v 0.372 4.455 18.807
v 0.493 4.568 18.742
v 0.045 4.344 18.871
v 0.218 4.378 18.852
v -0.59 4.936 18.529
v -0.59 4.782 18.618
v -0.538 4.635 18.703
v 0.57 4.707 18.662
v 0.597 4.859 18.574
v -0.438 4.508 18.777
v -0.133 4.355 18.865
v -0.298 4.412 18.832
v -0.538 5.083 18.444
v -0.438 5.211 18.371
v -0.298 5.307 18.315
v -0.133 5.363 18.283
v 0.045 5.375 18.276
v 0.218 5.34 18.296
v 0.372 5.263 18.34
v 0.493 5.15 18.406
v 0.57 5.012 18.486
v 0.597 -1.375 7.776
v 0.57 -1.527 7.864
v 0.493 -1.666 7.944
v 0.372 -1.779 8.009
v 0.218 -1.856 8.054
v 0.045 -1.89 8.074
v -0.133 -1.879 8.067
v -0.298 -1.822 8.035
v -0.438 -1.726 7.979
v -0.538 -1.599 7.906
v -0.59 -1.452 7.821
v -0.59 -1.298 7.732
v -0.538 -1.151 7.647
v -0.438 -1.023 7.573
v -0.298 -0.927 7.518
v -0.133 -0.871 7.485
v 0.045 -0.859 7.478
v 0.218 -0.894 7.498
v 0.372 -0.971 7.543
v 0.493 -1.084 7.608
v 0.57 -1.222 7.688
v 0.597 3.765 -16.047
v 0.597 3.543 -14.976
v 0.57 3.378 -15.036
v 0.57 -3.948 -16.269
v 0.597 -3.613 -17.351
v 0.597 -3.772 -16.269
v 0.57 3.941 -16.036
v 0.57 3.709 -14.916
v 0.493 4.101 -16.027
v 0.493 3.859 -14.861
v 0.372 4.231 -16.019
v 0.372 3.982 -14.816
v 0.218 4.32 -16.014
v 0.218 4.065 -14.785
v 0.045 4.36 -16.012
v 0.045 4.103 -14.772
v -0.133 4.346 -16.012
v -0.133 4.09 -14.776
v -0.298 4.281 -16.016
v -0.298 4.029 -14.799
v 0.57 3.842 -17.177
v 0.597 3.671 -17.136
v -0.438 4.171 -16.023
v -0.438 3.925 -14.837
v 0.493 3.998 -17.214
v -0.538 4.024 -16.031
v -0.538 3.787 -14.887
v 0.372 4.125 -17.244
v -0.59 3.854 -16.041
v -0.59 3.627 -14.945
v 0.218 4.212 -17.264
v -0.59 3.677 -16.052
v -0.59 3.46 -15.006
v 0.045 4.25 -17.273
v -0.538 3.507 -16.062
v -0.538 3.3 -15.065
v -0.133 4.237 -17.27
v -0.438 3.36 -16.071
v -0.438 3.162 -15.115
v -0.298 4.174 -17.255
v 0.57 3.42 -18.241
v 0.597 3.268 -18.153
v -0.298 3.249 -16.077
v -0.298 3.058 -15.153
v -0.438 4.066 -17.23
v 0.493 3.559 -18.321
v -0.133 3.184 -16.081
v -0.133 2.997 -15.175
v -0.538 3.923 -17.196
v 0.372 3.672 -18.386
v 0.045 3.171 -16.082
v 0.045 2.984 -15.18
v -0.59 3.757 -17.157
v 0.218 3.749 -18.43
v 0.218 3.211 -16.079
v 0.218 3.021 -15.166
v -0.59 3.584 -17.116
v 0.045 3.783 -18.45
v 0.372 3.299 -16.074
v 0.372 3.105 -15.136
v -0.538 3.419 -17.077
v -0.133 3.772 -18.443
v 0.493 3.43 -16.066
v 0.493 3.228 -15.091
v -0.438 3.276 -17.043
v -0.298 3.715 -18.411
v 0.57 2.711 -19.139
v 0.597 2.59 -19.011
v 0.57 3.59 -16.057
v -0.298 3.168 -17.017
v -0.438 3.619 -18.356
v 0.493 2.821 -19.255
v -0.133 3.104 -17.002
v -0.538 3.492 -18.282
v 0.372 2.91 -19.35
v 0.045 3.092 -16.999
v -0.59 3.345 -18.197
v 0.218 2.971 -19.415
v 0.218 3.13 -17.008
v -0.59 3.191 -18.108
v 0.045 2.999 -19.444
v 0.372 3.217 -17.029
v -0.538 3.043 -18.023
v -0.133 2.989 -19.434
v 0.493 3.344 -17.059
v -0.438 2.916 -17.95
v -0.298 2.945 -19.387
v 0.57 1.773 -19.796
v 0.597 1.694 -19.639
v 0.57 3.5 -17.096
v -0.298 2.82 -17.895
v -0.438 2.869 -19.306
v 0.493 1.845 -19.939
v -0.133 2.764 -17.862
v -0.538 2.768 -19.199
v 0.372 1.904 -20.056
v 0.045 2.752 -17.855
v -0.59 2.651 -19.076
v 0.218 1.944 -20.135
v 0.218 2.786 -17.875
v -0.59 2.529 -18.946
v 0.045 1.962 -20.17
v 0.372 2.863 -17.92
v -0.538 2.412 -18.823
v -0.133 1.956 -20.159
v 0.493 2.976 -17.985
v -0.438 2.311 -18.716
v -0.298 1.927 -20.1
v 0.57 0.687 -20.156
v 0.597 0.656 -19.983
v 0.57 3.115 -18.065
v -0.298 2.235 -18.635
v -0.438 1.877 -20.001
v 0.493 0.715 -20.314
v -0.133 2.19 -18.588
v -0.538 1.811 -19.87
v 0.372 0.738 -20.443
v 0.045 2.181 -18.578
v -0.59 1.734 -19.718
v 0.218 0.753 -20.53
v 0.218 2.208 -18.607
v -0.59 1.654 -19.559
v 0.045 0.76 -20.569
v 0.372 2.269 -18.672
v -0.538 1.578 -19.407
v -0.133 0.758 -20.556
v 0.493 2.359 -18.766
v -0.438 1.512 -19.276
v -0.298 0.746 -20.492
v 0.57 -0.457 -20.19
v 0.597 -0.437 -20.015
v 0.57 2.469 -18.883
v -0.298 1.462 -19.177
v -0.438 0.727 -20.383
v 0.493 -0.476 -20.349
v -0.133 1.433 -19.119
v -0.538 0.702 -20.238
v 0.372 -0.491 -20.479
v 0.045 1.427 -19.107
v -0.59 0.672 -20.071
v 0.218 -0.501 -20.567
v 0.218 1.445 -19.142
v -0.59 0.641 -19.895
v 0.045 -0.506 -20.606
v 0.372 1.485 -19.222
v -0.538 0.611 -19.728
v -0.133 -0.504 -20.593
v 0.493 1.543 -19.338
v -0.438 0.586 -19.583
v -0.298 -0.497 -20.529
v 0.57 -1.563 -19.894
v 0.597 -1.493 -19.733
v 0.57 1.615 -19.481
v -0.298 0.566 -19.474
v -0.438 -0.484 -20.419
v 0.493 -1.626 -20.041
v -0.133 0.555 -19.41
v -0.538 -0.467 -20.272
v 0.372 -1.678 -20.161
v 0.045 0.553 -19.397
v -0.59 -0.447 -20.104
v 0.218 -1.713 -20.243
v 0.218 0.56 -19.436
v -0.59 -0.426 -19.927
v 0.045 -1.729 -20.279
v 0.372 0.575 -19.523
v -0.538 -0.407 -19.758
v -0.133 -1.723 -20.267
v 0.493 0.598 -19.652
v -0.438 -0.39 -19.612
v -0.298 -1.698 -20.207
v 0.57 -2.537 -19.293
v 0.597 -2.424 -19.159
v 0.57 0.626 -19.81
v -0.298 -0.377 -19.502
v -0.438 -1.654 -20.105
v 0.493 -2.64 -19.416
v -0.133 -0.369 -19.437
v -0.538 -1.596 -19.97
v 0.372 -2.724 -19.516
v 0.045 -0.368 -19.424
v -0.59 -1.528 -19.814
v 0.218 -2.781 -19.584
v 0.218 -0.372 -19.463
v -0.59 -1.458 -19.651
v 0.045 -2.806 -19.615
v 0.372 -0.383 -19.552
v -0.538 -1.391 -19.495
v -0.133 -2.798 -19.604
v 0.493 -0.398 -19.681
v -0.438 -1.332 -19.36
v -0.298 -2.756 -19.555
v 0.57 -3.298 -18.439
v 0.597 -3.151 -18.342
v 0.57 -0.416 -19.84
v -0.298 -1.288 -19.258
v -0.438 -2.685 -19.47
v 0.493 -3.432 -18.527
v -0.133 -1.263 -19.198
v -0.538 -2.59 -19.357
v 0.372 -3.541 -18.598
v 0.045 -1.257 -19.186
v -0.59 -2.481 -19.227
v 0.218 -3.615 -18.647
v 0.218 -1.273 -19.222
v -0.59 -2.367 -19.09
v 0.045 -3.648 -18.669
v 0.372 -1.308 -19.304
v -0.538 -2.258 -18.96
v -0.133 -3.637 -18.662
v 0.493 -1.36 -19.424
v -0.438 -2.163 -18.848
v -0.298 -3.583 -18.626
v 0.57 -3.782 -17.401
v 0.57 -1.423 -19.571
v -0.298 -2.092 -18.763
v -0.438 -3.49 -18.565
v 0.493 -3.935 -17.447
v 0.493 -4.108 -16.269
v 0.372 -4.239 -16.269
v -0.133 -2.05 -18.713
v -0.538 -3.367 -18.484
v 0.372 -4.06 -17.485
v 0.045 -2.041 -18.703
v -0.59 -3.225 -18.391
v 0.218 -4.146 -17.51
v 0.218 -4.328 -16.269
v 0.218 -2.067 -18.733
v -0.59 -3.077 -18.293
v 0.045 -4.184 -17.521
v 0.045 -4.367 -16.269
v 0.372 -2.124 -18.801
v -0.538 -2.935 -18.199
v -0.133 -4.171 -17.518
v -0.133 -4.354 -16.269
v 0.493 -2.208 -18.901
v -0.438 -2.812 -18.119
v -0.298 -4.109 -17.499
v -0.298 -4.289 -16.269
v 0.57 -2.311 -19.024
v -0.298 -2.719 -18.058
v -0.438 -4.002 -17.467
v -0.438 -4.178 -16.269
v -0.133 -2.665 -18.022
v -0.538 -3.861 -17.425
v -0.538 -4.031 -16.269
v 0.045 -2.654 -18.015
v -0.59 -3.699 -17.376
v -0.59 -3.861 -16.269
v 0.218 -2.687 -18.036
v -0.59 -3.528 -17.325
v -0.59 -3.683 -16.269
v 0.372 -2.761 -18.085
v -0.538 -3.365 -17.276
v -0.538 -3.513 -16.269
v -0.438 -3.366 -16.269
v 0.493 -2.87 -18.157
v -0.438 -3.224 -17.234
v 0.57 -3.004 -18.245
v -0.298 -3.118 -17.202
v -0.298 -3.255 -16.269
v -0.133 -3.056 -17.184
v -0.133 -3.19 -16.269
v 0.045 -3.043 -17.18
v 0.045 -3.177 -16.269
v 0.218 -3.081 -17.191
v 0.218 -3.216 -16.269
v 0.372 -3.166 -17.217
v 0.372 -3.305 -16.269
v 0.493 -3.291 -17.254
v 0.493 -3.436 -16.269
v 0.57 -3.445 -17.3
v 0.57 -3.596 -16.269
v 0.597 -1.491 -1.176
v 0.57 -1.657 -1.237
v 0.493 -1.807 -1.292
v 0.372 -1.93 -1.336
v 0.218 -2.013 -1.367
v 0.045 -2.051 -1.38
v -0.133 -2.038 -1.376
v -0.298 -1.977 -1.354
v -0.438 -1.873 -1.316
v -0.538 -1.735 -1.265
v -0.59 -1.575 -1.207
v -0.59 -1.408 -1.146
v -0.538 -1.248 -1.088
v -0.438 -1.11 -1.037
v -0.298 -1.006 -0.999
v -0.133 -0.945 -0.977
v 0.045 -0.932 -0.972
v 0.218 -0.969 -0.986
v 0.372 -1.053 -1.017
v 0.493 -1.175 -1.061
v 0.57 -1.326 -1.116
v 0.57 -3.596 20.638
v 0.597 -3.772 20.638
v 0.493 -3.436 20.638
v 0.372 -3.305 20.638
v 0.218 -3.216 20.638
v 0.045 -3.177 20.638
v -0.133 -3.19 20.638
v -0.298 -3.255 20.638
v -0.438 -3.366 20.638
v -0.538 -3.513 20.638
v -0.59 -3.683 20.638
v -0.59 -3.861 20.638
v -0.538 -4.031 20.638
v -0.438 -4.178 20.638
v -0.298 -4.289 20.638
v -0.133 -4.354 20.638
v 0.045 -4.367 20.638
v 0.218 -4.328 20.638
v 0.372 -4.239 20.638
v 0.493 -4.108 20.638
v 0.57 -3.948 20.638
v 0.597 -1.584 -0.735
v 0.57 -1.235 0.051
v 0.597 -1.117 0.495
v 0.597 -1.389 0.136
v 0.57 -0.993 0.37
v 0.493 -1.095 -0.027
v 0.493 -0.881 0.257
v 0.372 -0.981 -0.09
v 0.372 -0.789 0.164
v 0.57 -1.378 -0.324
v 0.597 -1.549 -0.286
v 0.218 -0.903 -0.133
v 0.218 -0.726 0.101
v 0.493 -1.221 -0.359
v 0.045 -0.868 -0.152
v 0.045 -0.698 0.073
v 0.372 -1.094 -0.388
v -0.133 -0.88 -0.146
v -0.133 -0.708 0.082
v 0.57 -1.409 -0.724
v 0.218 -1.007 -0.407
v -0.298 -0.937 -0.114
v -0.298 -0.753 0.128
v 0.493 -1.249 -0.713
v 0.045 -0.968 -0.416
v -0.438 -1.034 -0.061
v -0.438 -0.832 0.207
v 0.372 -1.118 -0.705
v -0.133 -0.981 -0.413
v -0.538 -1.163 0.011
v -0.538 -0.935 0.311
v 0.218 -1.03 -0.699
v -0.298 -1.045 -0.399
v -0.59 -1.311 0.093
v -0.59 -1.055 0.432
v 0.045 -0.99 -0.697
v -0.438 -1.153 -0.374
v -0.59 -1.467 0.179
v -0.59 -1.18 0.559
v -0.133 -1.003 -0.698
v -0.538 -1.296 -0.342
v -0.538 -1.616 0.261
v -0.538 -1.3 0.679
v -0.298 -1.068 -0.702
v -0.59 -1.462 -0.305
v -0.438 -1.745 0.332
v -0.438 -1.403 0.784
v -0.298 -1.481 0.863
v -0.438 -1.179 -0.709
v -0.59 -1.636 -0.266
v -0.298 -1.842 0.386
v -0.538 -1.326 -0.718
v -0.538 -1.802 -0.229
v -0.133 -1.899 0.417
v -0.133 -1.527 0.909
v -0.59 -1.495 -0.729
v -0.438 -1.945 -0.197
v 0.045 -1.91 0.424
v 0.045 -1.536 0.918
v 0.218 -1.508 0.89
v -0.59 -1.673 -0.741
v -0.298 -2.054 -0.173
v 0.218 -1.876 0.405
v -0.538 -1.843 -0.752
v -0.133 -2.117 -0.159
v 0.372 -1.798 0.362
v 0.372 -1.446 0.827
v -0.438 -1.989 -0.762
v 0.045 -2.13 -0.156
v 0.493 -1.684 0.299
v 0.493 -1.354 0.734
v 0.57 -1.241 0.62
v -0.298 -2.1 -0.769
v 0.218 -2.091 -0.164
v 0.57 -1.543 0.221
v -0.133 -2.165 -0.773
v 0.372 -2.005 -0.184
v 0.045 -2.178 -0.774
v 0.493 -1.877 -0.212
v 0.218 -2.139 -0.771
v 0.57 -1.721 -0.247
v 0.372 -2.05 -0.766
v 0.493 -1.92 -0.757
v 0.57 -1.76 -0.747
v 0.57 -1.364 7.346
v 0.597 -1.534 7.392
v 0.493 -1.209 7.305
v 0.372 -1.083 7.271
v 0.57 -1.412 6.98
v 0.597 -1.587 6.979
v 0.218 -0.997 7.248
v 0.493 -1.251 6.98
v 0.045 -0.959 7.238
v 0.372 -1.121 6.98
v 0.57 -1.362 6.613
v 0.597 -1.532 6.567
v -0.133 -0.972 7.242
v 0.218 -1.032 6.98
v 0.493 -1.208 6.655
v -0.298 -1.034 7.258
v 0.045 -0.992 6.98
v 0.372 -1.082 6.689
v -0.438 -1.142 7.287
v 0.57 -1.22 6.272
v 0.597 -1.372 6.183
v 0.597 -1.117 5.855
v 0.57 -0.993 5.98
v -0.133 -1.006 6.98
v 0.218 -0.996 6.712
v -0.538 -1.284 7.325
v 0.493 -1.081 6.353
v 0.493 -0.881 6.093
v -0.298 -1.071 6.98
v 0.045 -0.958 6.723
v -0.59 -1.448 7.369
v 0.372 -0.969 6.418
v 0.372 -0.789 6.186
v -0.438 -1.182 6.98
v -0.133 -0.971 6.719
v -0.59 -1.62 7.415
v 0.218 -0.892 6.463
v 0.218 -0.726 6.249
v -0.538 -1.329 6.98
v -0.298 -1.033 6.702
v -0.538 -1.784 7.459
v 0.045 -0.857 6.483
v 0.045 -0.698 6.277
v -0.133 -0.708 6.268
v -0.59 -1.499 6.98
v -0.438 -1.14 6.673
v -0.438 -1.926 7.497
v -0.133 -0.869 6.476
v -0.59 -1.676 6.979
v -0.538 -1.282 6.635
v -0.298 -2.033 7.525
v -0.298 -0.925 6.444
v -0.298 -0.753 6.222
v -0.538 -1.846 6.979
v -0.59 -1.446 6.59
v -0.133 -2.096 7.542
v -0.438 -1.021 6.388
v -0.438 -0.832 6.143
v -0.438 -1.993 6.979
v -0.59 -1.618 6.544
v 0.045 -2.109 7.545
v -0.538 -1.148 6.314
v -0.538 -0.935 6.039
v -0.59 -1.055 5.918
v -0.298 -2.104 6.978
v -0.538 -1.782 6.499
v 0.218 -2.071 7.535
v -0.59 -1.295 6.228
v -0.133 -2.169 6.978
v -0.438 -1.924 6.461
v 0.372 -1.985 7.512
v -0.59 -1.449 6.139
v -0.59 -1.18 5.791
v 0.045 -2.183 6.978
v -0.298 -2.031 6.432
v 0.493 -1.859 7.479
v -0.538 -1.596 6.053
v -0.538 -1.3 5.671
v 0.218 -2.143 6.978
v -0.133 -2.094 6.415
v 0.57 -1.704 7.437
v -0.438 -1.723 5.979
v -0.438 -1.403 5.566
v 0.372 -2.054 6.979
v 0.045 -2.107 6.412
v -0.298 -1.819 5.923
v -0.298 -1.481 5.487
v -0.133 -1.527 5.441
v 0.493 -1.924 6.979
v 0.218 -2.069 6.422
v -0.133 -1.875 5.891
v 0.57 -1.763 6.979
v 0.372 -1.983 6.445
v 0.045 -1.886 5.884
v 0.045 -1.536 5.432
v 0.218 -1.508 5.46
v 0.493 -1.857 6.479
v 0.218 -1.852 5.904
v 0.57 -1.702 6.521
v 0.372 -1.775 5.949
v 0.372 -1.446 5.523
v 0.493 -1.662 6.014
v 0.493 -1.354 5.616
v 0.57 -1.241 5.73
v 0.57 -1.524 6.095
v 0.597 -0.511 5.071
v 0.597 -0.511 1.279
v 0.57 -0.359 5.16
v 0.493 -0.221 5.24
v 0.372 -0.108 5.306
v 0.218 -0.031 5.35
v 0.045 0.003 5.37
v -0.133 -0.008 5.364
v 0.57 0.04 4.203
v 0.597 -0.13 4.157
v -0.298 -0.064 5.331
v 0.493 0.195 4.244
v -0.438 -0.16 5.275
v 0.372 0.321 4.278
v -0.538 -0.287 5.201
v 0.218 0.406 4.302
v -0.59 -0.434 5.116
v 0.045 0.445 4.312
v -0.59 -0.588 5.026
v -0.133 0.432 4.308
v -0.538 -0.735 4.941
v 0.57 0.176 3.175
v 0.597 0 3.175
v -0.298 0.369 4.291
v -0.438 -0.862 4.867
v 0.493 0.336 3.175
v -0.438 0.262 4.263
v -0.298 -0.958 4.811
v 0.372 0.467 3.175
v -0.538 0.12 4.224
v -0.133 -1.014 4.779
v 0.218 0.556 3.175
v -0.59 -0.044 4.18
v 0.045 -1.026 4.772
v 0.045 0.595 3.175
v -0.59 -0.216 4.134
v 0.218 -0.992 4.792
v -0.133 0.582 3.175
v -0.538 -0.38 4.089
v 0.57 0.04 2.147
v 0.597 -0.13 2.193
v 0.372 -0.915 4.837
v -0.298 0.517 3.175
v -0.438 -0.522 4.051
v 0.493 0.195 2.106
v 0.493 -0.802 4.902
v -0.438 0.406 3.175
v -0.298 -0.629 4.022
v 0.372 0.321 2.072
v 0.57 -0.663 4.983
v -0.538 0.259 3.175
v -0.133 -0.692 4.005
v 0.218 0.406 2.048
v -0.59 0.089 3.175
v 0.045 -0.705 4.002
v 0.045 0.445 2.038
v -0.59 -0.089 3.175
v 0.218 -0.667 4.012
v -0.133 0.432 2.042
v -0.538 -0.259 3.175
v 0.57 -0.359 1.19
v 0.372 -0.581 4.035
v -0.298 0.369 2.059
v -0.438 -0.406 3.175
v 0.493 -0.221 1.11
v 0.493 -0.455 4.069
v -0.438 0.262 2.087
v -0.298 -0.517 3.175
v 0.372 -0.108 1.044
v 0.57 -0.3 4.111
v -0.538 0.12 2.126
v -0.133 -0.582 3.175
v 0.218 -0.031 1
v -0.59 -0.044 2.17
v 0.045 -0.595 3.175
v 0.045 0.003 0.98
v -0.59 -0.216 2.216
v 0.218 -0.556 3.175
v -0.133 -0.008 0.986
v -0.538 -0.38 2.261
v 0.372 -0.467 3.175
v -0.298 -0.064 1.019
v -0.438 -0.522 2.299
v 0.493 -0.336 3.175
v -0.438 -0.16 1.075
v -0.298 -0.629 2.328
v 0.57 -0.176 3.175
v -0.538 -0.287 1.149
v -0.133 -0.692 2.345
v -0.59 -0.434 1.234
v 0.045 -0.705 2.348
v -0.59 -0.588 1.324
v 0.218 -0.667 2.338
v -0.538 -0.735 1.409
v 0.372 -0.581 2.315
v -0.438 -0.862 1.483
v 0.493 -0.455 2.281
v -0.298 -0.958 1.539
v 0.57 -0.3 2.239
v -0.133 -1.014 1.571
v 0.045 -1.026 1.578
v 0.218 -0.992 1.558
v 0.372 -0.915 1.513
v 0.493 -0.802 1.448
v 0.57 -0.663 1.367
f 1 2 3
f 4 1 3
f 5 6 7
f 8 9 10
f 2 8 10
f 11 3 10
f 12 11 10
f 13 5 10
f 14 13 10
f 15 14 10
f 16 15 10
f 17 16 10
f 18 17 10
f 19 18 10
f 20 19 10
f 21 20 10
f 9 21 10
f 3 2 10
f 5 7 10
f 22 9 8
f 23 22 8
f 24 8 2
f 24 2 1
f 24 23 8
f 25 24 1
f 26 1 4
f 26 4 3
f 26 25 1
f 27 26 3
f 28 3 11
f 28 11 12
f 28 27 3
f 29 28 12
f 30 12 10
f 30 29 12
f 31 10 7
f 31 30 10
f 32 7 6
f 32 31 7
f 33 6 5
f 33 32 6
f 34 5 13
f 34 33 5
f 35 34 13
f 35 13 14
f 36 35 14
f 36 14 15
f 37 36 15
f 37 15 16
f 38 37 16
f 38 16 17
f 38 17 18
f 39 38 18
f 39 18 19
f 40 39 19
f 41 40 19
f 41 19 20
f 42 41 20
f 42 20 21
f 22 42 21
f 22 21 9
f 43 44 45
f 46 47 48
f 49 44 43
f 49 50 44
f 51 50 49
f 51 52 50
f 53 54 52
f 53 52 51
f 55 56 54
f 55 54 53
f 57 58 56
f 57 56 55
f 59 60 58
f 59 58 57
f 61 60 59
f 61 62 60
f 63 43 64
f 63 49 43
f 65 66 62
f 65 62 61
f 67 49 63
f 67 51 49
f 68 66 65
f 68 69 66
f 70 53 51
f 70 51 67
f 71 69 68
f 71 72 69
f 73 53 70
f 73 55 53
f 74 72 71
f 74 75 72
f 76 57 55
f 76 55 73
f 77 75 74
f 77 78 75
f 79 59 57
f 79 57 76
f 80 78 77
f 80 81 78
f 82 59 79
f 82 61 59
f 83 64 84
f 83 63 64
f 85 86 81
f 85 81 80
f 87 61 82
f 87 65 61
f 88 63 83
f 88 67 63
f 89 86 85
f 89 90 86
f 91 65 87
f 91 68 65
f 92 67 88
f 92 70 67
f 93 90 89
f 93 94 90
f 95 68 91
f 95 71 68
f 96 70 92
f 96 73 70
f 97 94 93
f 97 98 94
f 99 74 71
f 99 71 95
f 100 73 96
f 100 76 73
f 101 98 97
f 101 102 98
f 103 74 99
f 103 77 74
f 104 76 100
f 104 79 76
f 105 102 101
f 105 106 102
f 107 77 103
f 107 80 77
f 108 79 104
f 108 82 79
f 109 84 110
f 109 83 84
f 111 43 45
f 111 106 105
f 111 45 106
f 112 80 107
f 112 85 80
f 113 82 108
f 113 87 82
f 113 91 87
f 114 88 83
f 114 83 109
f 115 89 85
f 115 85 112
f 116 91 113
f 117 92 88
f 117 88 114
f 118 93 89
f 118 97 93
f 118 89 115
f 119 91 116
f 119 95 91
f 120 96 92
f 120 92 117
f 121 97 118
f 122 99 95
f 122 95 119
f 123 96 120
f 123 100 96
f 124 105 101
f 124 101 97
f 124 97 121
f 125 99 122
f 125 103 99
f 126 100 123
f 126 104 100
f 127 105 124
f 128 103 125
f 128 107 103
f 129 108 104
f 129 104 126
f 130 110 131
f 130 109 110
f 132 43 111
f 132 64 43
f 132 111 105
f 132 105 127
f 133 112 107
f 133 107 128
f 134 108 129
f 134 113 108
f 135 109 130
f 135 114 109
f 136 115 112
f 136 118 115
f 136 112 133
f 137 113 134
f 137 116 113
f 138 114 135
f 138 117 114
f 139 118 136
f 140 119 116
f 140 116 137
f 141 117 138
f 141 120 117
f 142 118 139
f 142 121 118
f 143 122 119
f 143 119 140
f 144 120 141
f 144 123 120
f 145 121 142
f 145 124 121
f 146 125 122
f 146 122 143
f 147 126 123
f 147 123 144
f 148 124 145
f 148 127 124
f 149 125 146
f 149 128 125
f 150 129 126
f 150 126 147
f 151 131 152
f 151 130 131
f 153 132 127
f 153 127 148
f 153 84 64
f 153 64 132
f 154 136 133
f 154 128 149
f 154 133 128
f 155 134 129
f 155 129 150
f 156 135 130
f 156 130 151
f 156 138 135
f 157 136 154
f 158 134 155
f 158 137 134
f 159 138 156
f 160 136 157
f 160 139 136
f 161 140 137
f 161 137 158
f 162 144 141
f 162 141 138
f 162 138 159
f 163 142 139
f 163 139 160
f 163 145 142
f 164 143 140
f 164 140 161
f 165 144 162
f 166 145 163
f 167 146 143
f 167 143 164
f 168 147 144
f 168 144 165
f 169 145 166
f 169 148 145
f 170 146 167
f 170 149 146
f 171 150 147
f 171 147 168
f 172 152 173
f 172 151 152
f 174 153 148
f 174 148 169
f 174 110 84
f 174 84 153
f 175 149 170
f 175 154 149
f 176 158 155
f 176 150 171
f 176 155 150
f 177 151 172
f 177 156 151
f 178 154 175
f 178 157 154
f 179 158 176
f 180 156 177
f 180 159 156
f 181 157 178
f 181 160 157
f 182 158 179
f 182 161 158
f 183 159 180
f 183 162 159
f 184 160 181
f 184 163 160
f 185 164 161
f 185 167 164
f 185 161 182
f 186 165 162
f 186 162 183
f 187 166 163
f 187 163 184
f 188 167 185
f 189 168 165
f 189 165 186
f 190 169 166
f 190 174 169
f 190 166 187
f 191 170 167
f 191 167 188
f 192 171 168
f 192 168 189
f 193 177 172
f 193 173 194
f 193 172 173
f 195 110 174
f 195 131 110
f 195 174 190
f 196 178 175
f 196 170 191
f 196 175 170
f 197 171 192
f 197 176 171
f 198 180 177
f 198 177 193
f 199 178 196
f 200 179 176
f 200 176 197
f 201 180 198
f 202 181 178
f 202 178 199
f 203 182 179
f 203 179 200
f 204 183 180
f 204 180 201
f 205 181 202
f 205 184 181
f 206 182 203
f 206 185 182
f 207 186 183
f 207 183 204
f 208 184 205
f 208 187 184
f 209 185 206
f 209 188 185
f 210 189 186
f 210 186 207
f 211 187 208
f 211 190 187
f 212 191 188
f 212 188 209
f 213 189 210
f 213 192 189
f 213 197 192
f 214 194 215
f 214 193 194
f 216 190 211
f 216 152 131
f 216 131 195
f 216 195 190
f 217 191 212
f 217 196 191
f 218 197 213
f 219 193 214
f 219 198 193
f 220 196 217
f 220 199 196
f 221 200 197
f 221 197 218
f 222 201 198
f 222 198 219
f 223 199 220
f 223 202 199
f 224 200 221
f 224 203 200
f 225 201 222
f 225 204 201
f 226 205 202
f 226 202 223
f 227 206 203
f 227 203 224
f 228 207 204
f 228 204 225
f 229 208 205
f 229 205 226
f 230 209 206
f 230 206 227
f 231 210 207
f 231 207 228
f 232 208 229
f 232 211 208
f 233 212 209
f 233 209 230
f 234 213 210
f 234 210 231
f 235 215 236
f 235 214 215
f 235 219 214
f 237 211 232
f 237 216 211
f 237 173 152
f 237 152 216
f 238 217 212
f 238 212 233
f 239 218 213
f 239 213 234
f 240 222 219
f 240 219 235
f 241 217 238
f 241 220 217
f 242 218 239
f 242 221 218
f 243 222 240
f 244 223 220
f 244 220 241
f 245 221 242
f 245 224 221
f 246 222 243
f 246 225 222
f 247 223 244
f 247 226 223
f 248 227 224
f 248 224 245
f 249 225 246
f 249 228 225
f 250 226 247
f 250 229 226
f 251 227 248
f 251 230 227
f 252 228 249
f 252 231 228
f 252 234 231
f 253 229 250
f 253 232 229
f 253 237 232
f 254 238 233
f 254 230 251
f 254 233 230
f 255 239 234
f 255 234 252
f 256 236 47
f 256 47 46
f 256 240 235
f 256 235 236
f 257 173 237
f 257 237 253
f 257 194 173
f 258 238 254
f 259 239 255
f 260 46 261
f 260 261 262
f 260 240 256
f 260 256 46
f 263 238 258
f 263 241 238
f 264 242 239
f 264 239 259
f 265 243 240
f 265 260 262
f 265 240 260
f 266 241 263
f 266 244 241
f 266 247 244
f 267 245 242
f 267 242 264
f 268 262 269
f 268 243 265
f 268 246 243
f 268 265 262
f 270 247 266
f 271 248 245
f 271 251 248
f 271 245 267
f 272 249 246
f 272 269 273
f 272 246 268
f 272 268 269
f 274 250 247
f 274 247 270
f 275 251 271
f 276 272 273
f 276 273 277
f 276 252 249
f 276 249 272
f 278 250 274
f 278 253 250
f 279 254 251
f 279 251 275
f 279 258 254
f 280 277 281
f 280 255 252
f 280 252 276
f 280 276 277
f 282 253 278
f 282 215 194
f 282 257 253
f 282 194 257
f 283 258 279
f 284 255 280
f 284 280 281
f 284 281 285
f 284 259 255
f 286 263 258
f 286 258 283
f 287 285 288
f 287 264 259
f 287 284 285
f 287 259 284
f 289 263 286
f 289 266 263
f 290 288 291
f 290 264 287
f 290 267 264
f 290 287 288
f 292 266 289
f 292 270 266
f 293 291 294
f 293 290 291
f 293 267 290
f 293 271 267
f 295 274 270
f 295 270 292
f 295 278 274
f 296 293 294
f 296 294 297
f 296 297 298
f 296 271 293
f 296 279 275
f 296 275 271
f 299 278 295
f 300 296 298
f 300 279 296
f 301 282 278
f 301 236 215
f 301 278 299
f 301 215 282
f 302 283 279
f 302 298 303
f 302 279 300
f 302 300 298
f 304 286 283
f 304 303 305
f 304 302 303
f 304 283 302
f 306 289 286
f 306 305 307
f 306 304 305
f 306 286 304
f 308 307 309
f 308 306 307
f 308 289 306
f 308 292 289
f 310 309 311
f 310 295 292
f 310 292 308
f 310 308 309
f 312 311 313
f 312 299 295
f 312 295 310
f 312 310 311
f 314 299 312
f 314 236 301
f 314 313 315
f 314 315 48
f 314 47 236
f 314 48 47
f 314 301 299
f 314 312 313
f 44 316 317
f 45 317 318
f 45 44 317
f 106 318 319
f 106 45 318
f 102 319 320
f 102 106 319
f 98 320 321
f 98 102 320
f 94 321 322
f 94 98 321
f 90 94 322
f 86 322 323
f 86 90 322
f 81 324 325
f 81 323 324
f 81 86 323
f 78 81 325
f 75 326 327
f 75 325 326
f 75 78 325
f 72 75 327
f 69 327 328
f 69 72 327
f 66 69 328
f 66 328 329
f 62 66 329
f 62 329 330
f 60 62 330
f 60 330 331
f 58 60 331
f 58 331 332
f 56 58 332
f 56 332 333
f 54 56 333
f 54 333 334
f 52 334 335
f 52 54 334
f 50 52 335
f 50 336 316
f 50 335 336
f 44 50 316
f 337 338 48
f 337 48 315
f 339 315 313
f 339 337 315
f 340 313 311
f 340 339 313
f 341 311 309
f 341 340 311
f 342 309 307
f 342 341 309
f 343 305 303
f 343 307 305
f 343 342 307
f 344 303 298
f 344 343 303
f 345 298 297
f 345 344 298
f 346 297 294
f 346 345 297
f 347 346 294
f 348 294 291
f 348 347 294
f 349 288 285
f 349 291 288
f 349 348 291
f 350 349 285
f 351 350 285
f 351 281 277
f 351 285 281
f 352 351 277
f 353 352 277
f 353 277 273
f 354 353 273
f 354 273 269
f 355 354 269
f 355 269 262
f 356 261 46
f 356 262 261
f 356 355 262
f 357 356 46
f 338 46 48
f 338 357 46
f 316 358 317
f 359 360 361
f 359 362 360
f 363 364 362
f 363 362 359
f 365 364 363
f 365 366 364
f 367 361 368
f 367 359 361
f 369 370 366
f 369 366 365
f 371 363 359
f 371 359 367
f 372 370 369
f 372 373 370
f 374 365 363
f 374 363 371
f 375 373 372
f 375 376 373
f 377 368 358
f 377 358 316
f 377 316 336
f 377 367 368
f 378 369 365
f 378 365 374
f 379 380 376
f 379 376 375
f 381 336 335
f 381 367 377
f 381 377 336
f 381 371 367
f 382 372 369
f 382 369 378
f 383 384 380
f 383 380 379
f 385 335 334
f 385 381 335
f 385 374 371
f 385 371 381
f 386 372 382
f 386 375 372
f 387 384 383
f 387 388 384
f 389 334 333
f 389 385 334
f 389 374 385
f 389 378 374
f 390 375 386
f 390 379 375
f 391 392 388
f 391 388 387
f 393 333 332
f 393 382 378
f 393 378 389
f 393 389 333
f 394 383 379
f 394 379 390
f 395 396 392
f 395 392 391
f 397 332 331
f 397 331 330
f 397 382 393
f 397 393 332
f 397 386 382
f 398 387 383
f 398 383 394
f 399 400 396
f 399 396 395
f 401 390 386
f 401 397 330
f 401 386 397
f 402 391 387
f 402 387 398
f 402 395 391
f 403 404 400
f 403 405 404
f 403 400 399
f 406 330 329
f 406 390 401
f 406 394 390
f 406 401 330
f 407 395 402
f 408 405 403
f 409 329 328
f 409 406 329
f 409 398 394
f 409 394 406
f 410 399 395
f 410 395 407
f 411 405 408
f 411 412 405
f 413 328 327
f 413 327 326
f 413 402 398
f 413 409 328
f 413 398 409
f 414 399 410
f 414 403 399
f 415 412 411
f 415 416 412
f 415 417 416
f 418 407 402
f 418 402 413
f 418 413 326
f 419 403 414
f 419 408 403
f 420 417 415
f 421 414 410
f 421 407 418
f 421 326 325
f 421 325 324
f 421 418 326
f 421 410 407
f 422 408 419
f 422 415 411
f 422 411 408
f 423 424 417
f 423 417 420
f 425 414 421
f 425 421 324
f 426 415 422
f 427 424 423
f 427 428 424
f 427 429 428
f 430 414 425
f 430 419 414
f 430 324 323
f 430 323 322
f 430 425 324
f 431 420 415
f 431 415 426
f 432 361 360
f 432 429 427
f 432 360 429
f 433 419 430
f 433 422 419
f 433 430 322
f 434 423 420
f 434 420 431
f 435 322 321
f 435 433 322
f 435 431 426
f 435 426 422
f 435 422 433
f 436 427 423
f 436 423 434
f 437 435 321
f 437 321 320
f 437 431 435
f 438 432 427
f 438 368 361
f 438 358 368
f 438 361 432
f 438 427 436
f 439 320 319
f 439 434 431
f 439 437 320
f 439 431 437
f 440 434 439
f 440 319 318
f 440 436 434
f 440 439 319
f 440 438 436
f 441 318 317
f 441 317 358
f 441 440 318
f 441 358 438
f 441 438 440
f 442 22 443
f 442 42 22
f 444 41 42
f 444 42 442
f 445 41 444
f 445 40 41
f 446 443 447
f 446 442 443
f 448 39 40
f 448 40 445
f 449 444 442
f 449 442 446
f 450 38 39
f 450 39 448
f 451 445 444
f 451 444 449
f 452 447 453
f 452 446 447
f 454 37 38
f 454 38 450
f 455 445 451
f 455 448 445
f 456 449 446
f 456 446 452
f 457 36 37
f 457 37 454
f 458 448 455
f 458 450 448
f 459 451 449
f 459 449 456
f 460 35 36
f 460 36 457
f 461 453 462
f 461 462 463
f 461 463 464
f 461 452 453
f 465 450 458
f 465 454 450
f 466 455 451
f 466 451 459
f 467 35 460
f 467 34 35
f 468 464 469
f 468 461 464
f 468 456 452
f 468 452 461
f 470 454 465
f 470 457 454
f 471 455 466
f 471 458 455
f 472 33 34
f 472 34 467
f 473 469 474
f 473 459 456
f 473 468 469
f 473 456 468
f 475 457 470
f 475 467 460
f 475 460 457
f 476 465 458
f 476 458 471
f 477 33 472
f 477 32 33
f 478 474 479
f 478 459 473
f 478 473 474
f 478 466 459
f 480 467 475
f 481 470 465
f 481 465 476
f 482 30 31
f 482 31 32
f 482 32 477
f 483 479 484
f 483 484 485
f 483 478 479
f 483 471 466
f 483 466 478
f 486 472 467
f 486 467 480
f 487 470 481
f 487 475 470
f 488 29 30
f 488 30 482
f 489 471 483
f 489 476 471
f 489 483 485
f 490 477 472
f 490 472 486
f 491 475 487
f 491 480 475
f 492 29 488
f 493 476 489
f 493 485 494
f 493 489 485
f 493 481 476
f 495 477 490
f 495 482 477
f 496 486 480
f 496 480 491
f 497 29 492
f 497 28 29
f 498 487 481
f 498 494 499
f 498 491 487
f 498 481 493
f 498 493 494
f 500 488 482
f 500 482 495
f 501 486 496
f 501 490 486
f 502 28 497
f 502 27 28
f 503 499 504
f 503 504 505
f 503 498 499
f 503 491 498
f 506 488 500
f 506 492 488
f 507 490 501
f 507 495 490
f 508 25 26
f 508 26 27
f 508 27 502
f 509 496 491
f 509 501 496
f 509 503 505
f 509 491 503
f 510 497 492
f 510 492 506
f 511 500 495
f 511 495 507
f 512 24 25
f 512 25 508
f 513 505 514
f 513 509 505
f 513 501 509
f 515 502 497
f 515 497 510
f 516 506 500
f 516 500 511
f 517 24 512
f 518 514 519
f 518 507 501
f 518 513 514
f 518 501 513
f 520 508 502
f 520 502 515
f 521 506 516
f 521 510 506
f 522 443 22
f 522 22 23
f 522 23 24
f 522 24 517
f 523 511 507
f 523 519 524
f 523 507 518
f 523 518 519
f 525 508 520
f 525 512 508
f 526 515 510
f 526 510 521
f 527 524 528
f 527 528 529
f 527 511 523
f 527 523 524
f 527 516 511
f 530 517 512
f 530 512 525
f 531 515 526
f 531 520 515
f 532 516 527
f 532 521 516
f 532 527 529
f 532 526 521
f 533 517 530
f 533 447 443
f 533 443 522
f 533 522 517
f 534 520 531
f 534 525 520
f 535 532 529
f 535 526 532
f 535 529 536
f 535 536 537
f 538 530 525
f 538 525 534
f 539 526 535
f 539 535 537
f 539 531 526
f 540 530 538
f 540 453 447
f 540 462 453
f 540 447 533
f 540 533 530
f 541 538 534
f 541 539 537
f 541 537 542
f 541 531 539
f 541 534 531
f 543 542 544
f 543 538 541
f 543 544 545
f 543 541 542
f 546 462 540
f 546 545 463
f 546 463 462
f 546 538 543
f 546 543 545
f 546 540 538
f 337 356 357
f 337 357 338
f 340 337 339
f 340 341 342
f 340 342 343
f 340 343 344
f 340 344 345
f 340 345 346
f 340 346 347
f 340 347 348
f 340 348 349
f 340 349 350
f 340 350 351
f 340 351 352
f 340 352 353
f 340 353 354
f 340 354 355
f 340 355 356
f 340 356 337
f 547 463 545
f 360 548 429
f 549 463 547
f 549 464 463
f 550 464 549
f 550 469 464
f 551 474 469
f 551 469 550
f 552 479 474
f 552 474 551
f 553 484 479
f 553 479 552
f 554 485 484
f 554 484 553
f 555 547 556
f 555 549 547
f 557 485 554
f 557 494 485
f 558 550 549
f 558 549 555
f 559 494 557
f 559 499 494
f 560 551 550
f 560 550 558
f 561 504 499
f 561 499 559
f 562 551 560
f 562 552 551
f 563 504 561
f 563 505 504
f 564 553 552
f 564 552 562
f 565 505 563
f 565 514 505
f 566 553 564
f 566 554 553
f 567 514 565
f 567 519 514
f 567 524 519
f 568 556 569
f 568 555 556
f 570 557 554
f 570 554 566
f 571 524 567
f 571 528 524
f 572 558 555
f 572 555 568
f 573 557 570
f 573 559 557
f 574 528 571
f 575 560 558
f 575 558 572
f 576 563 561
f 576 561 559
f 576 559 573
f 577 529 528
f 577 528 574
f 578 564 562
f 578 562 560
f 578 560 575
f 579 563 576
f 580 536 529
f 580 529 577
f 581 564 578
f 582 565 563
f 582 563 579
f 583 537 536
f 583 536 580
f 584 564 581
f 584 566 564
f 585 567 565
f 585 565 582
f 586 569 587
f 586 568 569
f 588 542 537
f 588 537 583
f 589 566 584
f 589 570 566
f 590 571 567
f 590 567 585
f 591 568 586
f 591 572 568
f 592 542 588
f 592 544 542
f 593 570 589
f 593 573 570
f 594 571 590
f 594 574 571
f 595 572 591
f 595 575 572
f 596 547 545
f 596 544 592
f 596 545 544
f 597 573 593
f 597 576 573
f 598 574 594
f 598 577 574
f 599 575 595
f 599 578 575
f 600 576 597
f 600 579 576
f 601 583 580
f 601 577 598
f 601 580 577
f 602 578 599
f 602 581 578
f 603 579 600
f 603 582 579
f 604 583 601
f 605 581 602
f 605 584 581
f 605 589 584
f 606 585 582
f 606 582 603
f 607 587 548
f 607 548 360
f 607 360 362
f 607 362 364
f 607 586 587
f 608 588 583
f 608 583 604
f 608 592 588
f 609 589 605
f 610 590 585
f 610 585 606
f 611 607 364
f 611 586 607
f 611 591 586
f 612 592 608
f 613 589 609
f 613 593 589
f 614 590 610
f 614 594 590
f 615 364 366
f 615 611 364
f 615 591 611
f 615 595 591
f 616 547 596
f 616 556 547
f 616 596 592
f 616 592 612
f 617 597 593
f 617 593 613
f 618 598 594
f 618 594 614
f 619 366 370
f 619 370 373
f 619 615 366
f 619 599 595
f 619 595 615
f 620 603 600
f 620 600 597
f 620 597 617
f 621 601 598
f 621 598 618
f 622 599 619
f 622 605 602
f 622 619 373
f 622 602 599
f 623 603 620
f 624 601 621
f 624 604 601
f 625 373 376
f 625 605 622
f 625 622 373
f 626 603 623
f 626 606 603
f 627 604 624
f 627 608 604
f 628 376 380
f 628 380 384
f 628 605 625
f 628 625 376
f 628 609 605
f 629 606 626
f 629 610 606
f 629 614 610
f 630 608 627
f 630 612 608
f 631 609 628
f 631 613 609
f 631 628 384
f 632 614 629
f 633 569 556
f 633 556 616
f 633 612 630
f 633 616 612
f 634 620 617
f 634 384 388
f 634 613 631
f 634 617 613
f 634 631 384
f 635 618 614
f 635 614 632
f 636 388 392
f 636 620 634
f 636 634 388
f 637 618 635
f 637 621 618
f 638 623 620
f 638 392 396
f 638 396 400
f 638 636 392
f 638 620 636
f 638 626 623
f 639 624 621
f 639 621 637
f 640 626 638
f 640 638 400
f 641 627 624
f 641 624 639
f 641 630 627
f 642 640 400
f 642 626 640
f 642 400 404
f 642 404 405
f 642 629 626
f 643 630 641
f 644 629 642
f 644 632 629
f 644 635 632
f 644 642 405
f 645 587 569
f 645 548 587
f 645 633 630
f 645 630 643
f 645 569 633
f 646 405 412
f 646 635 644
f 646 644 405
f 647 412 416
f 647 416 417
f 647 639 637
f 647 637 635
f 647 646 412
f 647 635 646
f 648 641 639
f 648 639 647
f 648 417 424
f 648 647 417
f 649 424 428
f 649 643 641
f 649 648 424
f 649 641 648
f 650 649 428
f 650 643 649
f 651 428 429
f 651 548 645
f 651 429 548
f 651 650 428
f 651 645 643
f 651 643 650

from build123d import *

# Parameters (mm, degrees)
SKETCH3_R = 0.5969


with BuildPart() as part:
    # Sweep1: sweep along a path in Sketch4
    with BuildLine(Plane(origin=(0, 0, 0), x_dir=(0, 0, -1), z_dir=(1, 0, 0))) as sweep1_path:
        Line((-18.57375, 4.859208931), (-7.776103247, -1.374815329))
        ThreePointArc((-7.776103247, -1.374815329), (-6.771462378, -1.573429786), (-5.854582736, -1.117268957))
        ThreePointArc((-5.854582736, -1.117268957), (-3.175, 0), (-0.495417264, -1.117268957))
        ThreePointArc((-0.495417264, -1.117268957), (0.28573535, -1.549197303), (1.176473152, -1.491338251))
        Line((1.176473152, -1.491338251), (14.975871107, 3.543419685))
        ThreePointArc((14.975871107, 3.543419685), (19.983040744, 0.656431604), (16.2687, -3.7719))
        Line((16.2687, -3.7719), (-20.6375, -3.7719))
    # Sketch3 → Sweep1 (sweep)
    with BuildSketch(Plane.XY.offset(20.6375)):
        with Locations((0, -3.7719)):
            Circle(SKETCH3_R)
    sweep(path=sweep1_path.line)


solid = part.part
